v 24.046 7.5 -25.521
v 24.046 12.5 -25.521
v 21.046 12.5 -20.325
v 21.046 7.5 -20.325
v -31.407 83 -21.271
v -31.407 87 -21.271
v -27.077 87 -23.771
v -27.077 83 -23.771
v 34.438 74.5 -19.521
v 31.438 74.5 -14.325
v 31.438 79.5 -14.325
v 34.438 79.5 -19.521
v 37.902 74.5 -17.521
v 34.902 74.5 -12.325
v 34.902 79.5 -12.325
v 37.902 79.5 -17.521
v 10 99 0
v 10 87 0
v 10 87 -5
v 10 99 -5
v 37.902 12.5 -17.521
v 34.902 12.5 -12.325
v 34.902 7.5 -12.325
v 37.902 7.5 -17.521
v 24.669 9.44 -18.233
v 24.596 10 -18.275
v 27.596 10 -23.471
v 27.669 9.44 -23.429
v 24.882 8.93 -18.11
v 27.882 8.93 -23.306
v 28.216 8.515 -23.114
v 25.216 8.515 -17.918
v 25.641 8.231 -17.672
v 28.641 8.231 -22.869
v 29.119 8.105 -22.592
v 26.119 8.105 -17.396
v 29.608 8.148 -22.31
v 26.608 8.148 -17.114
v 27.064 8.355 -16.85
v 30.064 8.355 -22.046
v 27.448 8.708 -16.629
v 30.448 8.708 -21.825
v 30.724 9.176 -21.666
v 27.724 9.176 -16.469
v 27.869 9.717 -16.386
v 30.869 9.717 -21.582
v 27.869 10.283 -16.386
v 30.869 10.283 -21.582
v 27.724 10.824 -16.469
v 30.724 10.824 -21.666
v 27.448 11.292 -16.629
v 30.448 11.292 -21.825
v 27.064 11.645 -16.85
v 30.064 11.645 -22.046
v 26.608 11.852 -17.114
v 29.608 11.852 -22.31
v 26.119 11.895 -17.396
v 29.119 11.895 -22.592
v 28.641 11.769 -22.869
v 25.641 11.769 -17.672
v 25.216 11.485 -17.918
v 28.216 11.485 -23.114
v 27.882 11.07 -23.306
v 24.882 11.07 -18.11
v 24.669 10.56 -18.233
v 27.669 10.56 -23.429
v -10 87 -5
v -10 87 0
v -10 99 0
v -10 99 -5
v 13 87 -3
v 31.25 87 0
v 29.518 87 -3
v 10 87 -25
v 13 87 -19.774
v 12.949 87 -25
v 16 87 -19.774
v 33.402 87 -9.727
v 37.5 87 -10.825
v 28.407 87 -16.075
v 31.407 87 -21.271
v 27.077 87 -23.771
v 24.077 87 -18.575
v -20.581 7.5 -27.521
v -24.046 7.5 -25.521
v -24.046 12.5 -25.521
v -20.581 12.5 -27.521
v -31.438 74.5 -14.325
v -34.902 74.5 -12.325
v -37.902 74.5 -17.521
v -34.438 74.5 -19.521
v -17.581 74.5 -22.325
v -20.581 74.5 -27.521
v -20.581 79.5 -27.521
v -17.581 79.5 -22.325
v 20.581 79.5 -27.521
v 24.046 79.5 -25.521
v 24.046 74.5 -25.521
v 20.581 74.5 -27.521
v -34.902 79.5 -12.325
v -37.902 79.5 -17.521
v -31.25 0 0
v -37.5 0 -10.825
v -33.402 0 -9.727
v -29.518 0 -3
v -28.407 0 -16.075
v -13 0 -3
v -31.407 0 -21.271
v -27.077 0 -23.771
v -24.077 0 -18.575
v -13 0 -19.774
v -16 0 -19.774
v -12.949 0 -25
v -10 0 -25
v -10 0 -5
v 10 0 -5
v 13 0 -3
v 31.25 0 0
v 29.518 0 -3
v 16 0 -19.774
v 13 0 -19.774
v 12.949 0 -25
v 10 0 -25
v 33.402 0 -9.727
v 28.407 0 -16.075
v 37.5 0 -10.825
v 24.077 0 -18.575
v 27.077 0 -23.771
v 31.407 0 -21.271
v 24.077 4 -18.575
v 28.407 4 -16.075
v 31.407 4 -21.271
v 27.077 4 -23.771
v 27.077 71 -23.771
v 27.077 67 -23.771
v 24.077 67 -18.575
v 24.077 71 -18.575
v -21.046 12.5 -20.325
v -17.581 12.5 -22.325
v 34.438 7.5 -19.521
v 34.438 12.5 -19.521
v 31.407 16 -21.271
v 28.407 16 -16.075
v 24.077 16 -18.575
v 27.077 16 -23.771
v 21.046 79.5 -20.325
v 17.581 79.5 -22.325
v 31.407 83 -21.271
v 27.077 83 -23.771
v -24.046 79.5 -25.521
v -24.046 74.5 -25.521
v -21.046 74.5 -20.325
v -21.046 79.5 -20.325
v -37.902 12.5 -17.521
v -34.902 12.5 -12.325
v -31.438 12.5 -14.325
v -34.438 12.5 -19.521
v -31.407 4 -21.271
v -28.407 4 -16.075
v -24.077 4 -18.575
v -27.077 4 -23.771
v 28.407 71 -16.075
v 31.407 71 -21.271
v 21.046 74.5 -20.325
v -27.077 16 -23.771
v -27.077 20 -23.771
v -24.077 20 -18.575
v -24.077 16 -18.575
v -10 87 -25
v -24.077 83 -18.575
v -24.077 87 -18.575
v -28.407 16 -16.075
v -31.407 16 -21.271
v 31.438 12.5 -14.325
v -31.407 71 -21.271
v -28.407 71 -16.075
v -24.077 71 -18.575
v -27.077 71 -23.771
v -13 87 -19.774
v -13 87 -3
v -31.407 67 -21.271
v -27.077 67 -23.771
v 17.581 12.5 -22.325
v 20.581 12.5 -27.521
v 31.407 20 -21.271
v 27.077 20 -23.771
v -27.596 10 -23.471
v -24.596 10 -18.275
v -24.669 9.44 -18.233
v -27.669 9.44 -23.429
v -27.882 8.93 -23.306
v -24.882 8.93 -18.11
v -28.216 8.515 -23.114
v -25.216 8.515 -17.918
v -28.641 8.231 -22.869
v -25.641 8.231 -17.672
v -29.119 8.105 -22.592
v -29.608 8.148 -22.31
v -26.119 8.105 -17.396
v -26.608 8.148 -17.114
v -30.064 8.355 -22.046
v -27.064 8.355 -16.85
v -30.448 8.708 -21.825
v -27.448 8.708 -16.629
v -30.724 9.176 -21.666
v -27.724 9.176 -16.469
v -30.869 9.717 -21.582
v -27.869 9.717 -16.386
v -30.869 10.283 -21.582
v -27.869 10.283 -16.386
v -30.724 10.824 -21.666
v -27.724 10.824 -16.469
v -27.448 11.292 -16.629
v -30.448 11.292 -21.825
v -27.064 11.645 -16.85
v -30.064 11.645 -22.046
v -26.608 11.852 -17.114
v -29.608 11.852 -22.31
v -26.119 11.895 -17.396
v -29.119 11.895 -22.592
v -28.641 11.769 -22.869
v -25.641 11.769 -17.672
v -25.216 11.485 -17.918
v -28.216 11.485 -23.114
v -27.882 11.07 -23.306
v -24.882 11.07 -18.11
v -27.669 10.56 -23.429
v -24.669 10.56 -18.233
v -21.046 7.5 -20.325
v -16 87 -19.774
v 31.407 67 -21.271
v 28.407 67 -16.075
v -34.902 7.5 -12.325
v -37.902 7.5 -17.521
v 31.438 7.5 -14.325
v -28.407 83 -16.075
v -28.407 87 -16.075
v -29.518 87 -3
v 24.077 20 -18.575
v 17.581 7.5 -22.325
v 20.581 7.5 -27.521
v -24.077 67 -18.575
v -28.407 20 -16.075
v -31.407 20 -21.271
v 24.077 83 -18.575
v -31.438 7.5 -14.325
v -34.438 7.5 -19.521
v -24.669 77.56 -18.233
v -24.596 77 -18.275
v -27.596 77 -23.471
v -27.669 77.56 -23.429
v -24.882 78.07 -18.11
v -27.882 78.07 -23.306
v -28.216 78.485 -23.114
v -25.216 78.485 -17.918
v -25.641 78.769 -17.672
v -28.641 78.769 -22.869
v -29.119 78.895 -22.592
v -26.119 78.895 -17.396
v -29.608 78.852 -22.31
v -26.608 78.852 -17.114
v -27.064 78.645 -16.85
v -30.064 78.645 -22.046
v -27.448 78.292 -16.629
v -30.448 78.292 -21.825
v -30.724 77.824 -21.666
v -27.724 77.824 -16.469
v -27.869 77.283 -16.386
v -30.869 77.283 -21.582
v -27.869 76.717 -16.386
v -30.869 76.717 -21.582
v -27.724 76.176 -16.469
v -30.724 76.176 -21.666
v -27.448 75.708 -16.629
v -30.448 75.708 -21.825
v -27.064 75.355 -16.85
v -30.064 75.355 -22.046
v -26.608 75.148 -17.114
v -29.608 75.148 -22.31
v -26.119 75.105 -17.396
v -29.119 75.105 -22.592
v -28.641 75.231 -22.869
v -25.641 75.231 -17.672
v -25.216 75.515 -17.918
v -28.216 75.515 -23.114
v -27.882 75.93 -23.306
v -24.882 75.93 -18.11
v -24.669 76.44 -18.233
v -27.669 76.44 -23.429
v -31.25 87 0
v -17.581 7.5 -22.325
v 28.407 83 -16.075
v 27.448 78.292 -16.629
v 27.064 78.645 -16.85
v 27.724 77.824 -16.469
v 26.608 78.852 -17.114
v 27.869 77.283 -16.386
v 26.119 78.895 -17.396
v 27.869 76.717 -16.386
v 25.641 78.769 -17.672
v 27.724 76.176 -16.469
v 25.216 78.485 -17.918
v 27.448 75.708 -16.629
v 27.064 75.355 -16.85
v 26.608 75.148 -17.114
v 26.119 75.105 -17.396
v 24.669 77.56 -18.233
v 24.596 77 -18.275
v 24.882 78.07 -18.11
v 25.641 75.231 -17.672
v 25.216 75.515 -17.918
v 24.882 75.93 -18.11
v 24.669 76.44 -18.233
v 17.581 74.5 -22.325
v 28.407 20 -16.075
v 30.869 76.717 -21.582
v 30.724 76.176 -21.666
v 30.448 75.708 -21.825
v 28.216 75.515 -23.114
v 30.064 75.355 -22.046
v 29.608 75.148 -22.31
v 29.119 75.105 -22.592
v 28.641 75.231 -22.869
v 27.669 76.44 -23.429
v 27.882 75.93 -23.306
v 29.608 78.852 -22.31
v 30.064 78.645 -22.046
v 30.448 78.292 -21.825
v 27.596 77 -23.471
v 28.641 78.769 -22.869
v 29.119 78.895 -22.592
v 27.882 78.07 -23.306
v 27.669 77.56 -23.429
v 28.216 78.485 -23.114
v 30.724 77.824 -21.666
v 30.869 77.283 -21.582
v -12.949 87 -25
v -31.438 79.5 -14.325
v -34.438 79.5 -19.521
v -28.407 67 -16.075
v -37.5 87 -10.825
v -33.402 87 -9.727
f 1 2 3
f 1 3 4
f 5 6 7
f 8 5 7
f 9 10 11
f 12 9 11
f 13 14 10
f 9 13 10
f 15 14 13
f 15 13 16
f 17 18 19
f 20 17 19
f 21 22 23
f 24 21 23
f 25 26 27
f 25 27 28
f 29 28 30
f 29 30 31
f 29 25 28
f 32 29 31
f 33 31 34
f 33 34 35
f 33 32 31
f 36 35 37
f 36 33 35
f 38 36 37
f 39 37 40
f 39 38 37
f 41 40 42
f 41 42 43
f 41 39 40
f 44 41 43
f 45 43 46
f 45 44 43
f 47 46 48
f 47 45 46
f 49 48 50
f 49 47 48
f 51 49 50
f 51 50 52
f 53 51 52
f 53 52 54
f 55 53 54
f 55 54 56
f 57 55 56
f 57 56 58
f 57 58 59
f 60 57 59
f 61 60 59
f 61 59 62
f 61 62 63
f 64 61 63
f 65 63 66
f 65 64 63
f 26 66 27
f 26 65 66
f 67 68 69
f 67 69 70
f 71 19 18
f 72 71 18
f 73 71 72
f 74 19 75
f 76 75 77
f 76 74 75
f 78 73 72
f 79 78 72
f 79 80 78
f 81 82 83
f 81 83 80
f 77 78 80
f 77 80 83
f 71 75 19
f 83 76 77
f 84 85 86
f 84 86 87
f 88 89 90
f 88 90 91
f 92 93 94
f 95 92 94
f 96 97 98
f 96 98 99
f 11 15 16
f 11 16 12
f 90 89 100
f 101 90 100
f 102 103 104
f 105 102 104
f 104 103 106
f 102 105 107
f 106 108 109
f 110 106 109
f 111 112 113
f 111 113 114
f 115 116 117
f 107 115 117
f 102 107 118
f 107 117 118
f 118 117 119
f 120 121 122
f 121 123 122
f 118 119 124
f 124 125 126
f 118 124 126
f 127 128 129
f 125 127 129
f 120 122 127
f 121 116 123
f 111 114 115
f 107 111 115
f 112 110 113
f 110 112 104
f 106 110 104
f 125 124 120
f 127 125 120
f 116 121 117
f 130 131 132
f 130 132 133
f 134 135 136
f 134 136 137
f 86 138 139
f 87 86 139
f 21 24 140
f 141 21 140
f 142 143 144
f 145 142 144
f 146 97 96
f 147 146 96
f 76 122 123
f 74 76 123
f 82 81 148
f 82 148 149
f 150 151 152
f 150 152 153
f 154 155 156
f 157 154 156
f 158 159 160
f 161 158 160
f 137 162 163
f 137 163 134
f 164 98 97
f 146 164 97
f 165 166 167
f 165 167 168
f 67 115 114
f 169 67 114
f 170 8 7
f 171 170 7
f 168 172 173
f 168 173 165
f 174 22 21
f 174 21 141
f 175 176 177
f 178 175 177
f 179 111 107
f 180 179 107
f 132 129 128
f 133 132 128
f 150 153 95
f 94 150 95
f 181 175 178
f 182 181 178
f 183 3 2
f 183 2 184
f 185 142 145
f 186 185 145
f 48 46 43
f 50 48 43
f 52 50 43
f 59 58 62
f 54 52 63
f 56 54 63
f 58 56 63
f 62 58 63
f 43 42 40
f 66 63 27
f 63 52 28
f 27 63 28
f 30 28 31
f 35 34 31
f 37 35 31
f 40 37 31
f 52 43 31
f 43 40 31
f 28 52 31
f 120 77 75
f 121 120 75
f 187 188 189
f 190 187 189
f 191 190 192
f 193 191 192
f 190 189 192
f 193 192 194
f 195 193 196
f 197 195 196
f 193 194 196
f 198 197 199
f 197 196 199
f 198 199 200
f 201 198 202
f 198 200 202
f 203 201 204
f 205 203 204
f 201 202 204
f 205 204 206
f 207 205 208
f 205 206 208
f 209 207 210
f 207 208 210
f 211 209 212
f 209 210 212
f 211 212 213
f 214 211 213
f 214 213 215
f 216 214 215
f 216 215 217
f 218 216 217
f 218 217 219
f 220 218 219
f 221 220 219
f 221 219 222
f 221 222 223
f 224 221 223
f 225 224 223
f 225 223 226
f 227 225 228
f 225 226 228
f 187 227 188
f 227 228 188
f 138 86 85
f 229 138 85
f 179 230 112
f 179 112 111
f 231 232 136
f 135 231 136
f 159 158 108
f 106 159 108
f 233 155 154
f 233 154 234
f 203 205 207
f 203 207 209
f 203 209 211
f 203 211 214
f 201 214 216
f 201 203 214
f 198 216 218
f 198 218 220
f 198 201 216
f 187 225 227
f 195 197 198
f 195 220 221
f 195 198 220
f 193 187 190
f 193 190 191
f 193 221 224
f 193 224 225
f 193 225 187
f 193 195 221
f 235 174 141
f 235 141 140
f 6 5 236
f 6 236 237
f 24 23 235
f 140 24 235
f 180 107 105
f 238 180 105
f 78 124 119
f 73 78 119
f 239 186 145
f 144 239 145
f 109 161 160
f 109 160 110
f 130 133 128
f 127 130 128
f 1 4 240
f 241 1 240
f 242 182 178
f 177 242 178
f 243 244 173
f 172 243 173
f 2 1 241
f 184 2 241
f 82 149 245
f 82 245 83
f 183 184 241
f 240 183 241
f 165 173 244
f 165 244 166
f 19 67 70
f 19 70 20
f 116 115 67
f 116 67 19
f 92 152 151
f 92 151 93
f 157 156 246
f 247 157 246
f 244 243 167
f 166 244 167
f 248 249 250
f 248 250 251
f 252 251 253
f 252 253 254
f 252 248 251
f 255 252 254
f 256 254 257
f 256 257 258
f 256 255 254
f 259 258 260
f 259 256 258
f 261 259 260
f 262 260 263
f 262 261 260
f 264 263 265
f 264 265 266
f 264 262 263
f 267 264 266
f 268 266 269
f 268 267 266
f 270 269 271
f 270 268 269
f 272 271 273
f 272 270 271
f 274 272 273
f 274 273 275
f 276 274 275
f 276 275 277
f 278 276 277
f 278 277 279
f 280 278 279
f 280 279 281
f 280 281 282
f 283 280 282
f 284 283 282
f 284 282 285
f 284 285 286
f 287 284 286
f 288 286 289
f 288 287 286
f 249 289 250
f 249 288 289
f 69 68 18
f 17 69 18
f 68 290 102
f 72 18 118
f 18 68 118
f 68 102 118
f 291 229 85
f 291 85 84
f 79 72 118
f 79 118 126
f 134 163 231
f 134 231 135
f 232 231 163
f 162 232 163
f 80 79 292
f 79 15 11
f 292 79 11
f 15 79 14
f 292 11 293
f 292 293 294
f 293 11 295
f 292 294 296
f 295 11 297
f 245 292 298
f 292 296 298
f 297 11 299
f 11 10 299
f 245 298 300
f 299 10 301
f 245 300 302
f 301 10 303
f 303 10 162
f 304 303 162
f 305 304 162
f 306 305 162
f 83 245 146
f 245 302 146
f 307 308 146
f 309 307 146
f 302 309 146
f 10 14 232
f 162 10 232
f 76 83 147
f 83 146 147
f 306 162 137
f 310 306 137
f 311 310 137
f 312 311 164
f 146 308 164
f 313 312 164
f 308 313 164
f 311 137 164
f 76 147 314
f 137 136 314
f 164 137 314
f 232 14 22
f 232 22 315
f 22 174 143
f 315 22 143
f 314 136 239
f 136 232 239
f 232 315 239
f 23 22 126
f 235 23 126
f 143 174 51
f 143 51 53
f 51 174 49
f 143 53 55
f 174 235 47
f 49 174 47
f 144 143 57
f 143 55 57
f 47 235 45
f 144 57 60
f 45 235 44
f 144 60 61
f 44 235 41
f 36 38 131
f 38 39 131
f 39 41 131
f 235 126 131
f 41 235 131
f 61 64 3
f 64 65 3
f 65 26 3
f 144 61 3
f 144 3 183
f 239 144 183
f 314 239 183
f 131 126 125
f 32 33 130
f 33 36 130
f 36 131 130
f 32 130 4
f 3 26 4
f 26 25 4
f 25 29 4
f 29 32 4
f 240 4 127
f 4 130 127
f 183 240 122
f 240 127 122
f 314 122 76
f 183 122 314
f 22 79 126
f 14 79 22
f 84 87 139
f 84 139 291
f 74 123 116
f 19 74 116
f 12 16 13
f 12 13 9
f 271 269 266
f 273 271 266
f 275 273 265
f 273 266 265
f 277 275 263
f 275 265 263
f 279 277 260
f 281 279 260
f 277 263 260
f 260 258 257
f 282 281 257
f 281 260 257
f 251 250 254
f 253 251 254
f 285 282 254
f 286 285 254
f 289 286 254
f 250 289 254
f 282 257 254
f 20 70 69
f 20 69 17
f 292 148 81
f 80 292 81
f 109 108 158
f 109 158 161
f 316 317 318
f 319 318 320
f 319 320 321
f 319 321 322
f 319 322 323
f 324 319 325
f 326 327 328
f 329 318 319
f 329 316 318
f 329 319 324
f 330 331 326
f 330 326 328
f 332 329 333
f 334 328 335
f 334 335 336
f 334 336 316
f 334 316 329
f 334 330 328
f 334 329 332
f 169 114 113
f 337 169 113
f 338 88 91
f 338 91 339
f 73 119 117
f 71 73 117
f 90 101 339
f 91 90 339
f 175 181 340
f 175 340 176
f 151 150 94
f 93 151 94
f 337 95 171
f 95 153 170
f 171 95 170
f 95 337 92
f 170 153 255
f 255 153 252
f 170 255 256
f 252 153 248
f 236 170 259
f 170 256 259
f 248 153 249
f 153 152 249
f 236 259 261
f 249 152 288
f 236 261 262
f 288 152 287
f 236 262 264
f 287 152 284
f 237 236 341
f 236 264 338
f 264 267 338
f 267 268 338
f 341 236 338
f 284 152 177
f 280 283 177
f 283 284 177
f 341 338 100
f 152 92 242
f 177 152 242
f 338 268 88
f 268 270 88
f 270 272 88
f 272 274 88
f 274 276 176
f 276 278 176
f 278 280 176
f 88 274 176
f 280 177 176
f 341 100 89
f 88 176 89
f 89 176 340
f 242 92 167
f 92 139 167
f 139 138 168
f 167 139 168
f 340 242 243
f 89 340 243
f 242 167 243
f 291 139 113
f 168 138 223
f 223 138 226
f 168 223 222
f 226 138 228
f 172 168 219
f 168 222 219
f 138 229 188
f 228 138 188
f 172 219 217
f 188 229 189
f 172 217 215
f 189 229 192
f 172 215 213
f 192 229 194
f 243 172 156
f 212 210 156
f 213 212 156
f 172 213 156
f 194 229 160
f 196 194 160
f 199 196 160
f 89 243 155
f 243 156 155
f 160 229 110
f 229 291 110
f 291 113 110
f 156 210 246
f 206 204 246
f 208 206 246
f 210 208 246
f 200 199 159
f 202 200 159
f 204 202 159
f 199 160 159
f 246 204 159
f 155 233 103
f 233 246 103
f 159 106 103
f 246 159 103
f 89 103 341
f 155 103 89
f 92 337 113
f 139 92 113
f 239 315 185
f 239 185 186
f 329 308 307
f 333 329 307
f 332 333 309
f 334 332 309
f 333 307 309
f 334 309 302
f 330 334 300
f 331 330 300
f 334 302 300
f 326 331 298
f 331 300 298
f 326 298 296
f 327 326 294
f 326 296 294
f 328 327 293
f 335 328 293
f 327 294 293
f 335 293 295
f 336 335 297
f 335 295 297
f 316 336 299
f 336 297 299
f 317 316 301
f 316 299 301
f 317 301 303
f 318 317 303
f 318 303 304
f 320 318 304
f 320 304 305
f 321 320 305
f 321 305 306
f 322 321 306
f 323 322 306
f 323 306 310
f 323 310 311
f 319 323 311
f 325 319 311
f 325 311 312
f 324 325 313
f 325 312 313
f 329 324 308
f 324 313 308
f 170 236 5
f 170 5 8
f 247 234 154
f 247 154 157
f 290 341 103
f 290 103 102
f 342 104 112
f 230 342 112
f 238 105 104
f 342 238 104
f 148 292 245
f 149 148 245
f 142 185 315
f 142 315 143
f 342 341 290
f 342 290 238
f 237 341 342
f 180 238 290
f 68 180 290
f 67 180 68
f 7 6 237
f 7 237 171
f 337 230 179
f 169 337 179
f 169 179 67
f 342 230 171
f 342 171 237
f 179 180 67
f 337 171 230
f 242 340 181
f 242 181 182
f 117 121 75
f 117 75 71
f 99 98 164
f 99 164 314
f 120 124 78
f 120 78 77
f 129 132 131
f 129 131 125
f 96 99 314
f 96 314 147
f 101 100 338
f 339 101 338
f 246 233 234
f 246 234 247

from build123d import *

# Parameters (mm, degrees)
BOSS_EXTRU_1_DEPTH          = 87
ENL_V_MAT_EXTRU_1_REACH     = 99.981
BOSS_EXTRU_2_DEPTH          = 87
ESQUISSE3_R                 = 1.9
ESQUISSE3_W                 = 5
ESQUISSE3_H                 = 4
ESQUISSE3_W_2               = 4
ESQUISSE3_H_2               = 5
BOSS_EXTRU_3_DEPTH          = 6
SYM_TRIE3_COPY_1_SKETCH_R   = 1.9
SYM_TRIE3_COPY_1_SKETCH_W   = 5
SYM_TRIE3_COPY_1_SKETCH_H   = 4
SYM_TRIE3_COPY_1_SKETCH_W_2 = 4
SYM_TRIE3_COPY_1_SKETCH_H_2 = 5
SYM_TRIE3_COPY_1_DEPTH      = 6
ESQUISSE5_W                 = 20
ESQUISSE5_H                 = 5
BOSS_EXTRU_4_DEPTH          = 12


with BuildPart() as part:
    # Esquisse1 → Boss.-Extru.1 (new body)
    with BuildSketch(Plane(origin=(0, 0, 0), x_dir=(1, 0, 0), z_dir=(0, 1, 0))):
        Polygon((-31.25, 0), (31.25, 0), (37.5, 10.825317547), (12.948729811, 25), (10, 25), (10, 5), (-10, 5), (-10, 25), (-12.948729811, 25), (-37.5, 10.825317547), align=None)
    extrude(amount=BOSS_EXTRU_1_DEPTH)

    # Esquisse2 → Enlèv. mat.-Extru.1 (cut, up to next)
    with BuildSketch(Plane(origin=(0, 87, 0), x_dir=(1, 0, 0), z_dir=(0, 1, 0)), mode=Mode.PRIVATE) as enl_v_mat_extru_1_sk1:
        Polygon((-36, 8.227241336), (-16, 19.77424672), (-13, 19.77424672), (-13, 0), (-31.25, 0), align=None)
    enl_v_mat_extru_1_tool1 = extrude(enl_v_mat_extru_1_sk1.sketch, amount=-ENL_V_MAT_EXTRU_1_REACH, mode=Mode.PRIVATE) & part.part
    enl_v_mat_extru_1 = enl_v_mat_extru_1_tool1.solids().sort_by_distance((-22.148909, 87, -8.14347))[0]
    add(enl_v_mat_extru_1, mode=Mode.SUBTRACT)

    # Symétrie1: Enlèv. mat.-Extru.1 across plane
    add(enl_v_mat_extru_1.mirror(Plane(origin=(0, 0, 0), x_dir=(0, 0, 1), z_dir=(1, 0, 0))), mode=Mode.SUBTRACT)

    # Esquisse4 → Boss.-Extru.2 (add)
    with BuildSketch(Plane(origin=(0, 0, 0), x_dir=(1, 0, 0), z_dir=(0, 1, 0))):
        Polygon((-37.5, 10.825317547), (-31.25, 0), (31.25, 0), (37.5, 10.825317547), (34.901923789, 12.325317547), (29.517949192, 3), (-29.517949192, 3), (-34.901923789, 12.325317547), align=None)
    extrude(amount=BOSS_EXTRU_2_DEPTH)

    # Esquisse3 → Boss.-Extru.3 (add)
    with BuildSketch(Plane(origin=(-14.0625, 0, -24.356964481), x_dir=(0.8660254037844396, 0, -0.4999999999999984), z_dir=(0.49999999999999833, 0, 0.8660254037844395))):
        with Locations((-14.063293868, 77)):
            Circle(ESQUISSE3_R)
        with Locations((-14.063293868, 85)):
            Rectangle(ESQUISSE3_W, ESQUISSE3_H)
        with Locations((-22.063293868, 77)):
            Rectangle(ESQUISSE3_W_2, ESQUISSE3_H_2)
        with Locations((-6.063293868, 77)):
            Rectangle(ESQUISSE3_W_2, ESQUISSE3_H_2)
        with Locations((-14.063293868, 69)):
            Rectangle(ESQUISSE3_W, ESQUISSE3_H)
    boss_extru_3 = extrude(amount=-BOSS_EXTRU_3_DEPTH)

    # Symétrie2: Boss.-Extru.3 across plane
    add(boss_extru_3.mirror(Plane.ZX.offset(43.5)))

    # Symétrie3: Boss.-Extru.3 across plane
    add(boss_extru_3.mirror(Plane(origin=(0, 0, 0), x_dir=(0, 0, 1), z_dir=(1, 0, 0))))

    # Symétrie3 copy 1 sketch → Symétrie3 copy 1 (add)
    with BuildSketch(Plane(origin=(14.0625, 87, -24.356964481), x_dir=(-0.8660254037844396, 0, -0.4999999999999984), z_dir=(-0.49999999999999833, 0, 0.8660254037844395))):
        with Locations((-14.063293868, 77)):
            Circle(SYM_TRIE3_COPY_1_SKETCH_R)
        with Locations((-14.063293868, 85)):
            Rectangle(SYM_TRIE3_COPY_1_SKETCH_W, SYM_TRIE3_COPY_1_SKETCH_H)
        with Locations((-22.063293868, 77)):
            Rectangle(SYM_TRIE3_COPY_1_SKETCH_W_2, SYM_TRIE3_COPY_1_SKETCH_H_2)
        with Locations((-6.063293868, 77)):
            Rectangle(SYM_TRIE3_COPY_1_SKETCH_W_2, SYM_TRIE3_COPY_1_SKETCH_H_2)
        with Locations((-14.063293868, 69)):
            Rectangle(SYM_TRIE3_COPY_1_SKETCH_W, SYM_TRIE3_COPY_1_SKETCH_H)
    extrude(amount=-SYM_TRIE3_COPY_1_DEPTH)

    # Esquisse5 → Boss.-Extru.4 (add)
    with BuildSketch(Plane(origin=(0, 87, 0), x_dir=(1, 0, 0), z_dir=(0, 1, 0))):
        with Locations((0, 2.5)):
            Rectangle(ESQUISSE5_W, ESQUISSE5_H)
    extrude(amount=BOSS_EXTRU_4_DEPTH)


solid = part.part
